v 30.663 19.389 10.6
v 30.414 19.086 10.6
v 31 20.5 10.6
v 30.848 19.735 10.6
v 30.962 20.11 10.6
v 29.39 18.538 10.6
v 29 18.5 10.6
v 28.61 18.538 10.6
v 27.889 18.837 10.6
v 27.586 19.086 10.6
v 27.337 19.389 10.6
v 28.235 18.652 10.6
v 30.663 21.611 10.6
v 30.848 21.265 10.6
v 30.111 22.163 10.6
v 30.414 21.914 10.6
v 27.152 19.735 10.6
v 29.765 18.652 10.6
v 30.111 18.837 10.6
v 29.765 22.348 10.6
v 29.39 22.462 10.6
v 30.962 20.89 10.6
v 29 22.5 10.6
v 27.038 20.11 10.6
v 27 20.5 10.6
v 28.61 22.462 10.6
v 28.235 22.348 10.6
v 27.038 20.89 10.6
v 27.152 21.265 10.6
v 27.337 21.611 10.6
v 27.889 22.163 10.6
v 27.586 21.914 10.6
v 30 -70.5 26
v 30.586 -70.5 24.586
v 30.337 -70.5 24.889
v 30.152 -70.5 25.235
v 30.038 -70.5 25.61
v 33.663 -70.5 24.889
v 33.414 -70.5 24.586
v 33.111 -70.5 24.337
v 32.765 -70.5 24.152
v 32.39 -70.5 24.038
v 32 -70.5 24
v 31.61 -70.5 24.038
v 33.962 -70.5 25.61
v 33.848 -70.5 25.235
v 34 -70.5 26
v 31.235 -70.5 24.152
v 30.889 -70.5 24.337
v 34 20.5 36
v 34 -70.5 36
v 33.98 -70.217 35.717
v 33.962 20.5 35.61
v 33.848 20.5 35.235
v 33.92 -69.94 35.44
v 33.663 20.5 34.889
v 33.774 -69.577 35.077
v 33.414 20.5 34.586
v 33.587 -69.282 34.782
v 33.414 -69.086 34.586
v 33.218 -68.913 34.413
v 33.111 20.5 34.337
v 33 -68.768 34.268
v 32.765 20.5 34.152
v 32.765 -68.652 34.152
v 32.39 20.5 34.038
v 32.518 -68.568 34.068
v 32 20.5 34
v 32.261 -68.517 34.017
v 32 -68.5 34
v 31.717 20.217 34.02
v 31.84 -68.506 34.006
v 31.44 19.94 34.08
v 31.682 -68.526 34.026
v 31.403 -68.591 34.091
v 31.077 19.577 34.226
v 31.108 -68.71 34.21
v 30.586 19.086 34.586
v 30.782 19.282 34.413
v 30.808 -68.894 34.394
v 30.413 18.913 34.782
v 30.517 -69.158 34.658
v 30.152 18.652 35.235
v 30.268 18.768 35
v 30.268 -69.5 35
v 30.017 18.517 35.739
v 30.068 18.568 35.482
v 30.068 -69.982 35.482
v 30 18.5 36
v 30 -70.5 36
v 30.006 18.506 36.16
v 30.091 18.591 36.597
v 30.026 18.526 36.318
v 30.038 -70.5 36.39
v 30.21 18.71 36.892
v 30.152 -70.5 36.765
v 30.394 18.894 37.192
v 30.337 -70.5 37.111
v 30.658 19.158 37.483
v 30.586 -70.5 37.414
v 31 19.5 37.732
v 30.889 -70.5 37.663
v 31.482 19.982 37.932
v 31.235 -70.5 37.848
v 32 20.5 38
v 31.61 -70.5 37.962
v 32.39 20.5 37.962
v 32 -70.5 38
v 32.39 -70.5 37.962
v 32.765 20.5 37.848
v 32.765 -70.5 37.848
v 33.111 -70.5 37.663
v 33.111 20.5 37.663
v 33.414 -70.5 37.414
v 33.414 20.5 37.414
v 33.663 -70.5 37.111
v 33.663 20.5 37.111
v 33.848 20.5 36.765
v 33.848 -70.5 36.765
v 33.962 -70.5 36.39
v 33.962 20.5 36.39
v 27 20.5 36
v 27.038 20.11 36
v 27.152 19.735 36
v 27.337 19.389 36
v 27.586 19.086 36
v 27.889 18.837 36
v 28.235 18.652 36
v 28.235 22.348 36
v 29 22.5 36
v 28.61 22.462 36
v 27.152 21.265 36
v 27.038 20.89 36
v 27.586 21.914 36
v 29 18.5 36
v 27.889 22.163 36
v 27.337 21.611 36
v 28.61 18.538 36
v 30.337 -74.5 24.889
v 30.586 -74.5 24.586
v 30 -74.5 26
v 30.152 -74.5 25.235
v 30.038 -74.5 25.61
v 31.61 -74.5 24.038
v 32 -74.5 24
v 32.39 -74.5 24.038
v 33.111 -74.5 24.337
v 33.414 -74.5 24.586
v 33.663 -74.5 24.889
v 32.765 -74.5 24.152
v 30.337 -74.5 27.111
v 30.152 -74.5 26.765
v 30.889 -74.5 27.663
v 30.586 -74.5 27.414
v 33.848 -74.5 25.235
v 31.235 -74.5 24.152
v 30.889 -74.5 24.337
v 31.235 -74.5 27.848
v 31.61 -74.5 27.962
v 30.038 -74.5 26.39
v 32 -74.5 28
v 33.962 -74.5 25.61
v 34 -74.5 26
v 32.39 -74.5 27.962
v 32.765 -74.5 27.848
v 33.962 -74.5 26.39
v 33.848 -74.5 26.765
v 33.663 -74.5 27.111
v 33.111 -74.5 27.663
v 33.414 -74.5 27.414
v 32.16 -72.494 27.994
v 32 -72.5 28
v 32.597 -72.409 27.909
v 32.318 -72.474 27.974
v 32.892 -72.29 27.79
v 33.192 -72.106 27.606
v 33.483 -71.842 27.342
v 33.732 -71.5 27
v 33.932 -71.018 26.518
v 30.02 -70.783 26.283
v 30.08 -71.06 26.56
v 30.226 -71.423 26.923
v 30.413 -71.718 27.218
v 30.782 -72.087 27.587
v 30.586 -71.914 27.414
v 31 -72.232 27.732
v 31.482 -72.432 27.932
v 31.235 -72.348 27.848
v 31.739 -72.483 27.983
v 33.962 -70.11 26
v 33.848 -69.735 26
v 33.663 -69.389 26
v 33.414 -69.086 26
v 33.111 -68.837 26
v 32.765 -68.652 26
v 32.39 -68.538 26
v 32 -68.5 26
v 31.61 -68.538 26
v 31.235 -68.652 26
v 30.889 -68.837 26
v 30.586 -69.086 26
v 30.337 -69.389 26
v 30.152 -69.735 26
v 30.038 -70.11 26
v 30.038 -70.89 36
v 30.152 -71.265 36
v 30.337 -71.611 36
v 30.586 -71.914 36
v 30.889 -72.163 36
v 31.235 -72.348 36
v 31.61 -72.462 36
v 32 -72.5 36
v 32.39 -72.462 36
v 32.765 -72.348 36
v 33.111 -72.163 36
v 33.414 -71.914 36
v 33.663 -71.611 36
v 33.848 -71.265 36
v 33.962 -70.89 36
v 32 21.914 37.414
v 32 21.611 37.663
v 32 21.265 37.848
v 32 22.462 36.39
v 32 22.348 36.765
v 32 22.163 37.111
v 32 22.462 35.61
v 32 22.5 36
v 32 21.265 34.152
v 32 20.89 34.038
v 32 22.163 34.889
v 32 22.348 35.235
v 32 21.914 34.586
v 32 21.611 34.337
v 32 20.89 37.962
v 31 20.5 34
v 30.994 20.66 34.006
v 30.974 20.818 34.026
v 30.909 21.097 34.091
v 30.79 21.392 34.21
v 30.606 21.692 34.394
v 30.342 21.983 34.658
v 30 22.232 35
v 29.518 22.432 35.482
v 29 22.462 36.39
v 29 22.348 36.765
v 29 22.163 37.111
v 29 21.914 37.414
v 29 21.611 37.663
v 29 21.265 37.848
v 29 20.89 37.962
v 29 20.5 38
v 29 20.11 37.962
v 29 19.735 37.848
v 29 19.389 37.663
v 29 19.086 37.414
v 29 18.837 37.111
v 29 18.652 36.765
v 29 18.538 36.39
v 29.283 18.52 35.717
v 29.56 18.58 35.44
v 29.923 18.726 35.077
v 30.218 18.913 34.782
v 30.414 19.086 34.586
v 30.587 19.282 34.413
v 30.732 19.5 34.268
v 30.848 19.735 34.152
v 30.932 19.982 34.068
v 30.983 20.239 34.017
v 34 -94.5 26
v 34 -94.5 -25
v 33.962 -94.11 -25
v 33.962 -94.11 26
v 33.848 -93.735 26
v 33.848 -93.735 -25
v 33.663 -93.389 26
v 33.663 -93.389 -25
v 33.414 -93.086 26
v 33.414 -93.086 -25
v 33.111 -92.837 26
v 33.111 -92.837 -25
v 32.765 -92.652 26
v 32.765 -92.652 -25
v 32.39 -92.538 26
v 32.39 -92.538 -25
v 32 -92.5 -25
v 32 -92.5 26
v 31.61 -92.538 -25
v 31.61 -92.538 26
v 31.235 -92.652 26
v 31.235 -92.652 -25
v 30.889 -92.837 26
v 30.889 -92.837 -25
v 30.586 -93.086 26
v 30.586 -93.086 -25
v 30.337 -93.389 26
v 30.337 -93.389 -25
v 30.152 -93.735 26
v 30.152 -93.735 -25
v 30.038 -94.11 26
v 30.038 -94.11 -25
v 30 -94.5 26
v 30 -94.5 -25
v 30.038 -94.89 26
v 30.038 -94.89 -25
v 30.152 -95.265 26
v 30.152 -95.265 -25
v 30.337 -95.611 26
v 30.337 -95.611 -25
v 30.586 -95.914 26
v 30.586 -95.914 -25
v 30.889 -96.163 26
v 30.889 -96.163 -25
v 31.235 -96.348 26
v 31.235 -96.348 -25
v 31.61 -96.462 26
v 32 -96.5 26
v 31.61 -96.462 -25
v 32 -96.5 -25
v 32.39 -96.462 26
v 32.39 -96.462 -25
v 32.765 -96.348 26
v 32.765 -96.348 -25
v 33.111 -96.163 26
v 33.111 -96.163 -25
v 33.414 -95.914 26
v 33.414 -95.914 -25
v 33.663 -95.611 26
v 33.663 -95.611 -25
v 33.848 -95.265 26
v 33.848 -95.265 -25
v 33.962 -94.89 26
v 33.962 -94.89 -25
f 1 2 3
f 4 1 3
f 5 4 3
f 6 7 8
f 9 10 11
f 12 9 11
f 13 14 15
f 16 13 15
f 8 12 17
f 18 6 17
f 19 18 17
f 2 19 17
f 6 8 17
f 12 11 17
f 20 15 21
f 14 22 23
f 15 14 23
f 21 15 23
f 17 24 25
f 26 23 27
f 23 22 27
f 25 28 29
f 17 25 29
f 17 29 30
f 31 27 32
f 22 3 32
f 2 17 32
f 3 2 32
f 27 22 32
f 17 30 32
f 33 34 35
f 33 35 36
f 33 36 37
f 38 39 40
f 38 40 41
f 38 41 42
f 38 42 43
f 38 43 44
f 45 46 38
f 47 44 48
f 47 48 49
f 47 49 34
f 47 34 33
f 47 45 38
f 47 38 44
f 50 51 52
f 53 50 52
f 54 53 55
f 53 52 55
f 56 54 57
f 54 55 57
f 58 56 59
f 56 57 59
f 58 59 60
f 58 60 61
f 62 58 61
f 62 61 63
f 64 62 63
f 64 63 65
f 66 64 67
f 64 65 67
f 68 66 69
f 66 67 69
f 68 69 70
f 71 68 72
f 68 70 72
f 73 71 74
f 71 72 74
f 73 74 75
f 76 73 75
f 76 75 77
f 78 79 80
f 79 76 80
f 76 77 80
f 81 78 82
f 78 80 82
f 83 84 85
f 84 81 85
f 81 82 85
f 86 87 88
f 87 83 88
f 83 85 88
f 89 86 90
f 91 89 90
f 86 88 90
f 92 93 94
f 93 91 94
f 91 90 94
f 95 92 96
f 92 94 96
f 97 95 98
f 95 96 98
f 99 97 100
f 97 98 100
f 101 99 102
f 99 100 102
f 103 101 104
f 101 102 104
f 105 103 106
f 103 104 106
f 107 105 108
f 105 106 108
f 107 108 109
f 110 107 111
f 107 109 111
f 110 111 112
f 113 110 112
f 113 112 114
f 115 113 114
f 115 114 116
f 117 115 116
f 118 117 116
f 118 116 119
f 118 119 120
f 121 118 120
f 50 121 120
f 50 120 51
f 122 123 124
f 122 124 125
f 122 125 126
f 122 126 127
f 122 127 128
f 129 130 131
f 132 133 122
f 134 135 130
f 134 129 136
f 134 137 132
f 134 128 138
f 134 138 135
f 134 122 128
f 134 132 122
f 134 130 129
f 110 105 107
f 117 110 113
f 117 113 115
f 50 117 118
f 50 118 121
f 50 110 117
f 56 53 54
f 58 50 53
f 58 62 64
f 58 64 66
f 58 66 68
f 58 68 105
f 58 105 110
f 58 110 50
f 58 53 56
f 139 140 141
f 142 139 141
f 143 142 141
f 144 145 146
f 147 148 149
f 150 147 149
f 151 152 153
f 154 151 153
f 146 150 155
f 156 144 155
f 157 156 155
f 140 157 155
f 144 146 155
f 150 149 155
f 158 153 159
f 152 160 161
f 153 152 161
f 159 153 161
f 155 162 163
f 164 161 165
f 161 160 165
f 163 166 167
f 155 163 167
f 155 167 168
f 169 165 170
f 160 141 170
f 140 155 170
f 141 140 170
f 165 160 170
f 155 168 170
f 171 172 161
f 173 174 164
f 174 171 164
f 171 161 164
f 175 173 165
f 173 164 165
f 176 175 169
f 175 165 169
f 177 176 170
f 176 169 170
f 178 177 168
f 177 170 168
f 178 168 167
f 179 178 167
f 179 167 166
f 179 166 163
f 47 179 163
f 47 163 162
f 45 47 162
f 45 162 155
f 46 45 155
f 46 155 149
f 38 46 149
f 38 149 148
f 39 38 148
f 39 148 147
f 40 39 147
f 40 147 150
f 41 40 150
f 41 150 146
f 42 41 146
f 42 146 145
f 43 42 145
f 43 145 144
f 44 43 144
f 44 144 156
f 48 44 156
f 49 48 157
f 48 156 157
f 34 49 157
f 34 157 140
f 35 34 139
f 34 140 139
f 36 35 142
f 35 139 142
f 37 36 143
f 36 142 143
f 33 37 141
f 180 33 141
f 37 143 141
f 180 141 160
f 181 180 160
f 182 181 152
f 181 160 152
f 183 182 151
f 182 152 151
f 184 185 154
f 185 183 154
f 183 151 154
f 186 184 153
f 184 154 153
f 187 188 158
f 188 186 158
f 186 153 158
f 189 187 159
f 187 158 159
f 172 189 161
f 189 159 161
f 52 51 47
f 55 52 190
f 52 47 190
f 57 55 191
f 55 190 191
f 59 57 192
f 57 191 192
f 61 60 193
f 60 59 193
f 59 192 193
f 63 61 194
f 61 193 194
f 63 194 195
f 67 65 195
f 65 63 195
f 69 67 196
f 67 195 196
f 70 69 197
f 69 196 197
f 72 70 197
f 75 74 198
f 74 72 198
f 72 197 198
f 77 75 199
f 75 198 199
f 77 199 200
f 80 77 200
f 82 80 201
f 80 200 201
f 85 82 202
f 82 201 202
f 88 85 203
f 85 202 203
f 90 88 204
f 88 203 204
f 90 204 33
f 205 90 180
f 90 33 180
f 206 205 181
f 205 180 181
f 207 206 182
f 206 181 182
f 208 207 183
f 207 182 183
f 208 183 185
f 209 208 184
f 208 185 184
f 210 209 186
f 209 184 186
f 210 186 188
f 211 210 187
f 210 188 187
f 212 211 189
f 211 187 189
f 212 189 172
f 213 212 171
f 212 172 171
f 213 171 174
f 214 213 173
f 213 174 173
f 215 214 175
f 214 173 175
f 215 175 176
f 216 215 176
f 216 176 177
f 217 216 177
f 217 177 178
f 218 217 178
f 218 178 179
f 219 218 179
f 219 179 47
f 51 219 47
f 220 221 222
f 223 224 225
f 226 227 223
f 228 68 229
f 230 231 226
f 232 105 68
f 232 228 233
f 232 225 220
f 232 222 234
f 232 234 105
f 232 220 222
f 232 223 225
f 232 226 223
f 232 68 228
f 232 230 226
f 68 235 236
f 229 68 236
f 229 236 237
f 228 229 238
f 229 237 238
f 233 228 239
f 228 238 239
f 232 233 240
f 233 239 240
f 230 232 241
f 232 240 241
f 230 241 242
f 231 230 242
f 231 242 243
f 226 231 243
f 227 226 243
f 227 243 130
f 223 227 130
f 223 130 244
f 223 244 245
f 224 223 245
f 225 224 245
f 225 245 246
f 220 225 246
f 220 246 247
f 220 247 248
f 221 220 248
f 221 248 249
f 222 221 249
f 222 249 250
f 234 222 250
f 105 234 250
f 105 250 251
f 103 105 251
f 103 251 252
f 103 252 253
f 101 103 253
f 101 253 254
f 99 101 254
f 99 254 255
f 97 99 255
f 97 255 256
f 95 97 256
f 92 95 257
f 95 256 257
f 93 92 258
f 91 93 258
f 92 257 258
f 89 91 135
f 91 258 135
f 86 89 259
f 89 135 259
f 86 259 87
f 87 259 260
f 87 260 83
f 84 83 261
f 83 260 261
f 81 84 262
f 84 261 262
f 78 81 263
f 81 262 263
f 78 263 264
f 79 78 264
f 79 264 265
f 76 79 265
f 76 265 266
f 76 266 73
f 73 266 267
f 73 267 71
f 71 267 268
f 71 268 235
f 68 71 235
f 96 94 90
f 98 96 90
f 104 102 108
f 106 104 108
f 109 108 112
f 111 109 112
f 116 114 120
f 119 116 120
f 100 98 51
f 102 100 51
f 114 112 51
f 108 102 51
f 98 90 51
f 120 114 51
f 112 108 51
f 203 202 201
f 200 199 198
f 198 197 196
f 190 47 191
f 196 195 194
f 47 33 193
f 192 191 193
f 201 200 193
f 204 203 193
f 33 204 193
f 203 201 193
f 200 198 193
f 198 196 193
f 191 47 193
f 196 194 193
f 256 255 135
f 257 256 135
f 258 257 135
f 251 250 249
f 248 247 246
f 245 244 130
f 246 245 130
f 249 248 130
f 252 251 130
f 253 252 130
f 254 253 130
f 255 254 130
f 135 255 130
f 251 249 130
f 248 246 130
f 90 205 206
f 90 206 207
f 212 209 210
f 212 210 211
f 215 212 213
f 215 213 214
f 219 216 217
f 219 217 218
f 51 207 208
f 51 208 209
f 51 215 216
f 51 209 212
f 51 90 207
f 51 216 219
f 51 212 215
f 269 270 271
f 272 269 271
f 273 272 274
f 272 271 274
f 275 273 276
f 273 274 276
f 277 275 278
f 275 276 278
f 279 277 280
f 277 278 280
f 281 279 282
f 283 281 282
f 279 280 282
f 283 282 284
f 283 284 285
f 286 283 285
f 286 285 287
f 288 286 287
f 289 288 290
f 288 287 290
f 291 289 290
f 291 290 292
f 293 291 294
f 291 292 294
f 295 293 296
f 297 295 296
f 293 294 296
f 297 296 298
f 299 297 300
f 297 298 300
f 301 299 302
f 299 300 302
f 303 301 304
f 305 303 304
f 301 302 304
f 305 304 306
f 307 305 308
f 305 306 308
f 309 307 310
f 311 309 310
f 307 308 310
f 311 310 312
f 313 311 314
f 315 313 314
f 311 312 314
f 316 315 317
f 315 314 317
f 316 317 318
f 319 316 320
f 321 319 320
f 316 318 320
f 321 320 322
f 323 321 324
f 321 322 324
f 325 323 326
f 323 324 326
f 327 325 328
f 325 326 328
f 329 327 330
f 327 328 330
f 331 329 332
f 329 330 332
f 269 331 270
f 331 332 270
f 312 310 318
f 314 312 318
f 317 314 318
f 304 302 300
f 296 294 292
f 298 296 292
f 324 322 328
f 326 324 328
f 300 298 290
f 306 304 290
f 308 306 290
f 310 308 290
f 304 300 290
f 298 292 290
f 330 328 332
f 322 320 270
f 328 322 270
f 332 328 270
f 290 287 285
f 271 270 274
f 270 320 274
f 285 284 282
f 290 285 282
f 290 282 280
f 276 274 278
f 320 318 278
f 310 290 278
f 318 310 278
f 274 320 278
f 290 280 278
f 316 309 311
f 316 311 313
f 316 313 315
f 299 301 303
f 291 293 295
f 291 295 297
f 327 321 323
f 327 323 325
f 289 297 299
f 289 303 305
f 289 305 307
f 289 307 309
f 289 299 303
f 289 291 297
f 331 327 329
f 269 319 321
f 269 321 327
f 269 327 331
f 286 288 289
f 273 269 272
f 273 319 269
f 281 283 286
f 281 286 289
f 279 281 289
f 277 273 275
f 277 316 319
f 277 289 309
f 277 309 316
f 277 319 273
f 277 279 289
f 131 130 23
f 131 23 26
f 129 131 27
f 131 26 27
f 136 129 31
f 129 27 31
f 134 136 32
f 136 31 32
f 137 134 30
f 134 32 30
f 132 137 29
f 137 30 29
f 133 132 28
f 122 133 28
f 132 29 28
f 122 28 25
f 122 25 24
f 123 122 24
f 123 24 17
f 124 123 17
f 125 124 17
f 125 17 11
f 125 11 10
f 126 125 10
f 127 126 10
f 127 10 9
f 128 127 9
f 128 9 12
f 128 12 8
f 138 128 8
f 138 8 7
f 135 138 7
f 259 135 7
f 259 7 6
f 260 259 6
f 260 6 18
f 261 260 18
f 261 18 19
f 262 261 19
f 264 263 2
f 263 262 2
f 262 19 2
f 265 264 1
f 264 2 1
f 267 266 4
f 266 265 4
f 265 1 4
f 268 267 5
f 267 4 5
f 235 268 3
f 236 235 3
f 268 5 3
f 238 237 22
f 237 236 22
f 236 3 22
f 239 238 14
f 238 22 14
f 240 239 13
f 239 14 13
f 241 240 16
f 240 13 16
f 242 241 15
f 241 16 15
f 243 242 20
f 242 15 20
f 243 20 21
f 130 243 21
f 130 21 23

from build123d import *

# Parameters (mm, degrees)
SKETCH2_R           = 2
BOSS_EXTRUDE1_DEPTH = 51
SKETCH3_R           = 2
BOSS_EXTRUDE2_DEPTH = 4
SKETCH4_R           = 2
BOSS_EXTRUDE3_DEPTH = 10
SKETCH5_R           = 2
BOSS_EXTRUDE4_DEPTH = 91
SKETCH6_R           = 2
BOSS_EXTRUDE5_DEPTH = 3
SKETCH7_R           = 2
BOSS_EXTRUDE6_DEPTH = 25.4


with BuildPart() as part:
    # Sketch2 → Boss-Extrude1 (new body)
    with BuildSketch(Plane.XY.offset(-25)):
        with Locations((32, -94.5)):
            Circle(SKETCH2_R)
    extrude(amount=BOSS_EXTRUDE1_DEPTH)


with BuildPart() as body_2:
    # Sketch3 → Boss-Extrude2 (new body)
    with BuildSketch(Plane(origin=(0, -74.5, 0), x_dir=(1, 0, 0), z_dir=(0, 1, 0))):
        with Locations(Location((32, -26, 0), (0, 0, 270))):
            Circle(SKETCH3_R)
    extrude(amount=BOSS_EXTRUDE2_DEPTH)

    # Sketch4 → Boss-Extrude3 (add)
    with BuildSketch(Plane.XY.offset(26)):
        with Locations((32, -70.5)):
            Circle(SKETCH4_R)
    extrude(amount=BOSS_EXTRUDE3_DEPTH)

    # Sketch5 → Boss-Extrude4 (add)
    with BuildSketch(Plane(origin=(0, -70.5, 0), x_dir=(1, 0, 0), z_dir=(0, 1, 0))):
        with Locations((32, -36)):
            Circle(SKETCH5_R)
    extrude(amount=BOSS_EXTRUDE4_DEPTH)

    # Sketch6 → Boss-Extrude5 (add)
    with BuildSketch(Plane(origin=(29, 0, 0), x_dir=(0, 0, -1), z_dir=(1, 0, 0))):
        with Locations((-36, 20.5)):
            Circle(SKETCH6_R)
    extrude(amount=BOSS_EXTRUDE5_DEPTH)

    # Sketch7 → Boss-Extrude6 (add)
    with BuildSketch(Plane.XY.offset(10.6)):
        with Locations(Location((29, 20.5, 0), (0, 0, 90))):
            Circle(SKETCH7_R)
    extrude(amount=BOSS_EXTRUDE6_DEPTH)


solid = Compound([part.part, body_2.part])
